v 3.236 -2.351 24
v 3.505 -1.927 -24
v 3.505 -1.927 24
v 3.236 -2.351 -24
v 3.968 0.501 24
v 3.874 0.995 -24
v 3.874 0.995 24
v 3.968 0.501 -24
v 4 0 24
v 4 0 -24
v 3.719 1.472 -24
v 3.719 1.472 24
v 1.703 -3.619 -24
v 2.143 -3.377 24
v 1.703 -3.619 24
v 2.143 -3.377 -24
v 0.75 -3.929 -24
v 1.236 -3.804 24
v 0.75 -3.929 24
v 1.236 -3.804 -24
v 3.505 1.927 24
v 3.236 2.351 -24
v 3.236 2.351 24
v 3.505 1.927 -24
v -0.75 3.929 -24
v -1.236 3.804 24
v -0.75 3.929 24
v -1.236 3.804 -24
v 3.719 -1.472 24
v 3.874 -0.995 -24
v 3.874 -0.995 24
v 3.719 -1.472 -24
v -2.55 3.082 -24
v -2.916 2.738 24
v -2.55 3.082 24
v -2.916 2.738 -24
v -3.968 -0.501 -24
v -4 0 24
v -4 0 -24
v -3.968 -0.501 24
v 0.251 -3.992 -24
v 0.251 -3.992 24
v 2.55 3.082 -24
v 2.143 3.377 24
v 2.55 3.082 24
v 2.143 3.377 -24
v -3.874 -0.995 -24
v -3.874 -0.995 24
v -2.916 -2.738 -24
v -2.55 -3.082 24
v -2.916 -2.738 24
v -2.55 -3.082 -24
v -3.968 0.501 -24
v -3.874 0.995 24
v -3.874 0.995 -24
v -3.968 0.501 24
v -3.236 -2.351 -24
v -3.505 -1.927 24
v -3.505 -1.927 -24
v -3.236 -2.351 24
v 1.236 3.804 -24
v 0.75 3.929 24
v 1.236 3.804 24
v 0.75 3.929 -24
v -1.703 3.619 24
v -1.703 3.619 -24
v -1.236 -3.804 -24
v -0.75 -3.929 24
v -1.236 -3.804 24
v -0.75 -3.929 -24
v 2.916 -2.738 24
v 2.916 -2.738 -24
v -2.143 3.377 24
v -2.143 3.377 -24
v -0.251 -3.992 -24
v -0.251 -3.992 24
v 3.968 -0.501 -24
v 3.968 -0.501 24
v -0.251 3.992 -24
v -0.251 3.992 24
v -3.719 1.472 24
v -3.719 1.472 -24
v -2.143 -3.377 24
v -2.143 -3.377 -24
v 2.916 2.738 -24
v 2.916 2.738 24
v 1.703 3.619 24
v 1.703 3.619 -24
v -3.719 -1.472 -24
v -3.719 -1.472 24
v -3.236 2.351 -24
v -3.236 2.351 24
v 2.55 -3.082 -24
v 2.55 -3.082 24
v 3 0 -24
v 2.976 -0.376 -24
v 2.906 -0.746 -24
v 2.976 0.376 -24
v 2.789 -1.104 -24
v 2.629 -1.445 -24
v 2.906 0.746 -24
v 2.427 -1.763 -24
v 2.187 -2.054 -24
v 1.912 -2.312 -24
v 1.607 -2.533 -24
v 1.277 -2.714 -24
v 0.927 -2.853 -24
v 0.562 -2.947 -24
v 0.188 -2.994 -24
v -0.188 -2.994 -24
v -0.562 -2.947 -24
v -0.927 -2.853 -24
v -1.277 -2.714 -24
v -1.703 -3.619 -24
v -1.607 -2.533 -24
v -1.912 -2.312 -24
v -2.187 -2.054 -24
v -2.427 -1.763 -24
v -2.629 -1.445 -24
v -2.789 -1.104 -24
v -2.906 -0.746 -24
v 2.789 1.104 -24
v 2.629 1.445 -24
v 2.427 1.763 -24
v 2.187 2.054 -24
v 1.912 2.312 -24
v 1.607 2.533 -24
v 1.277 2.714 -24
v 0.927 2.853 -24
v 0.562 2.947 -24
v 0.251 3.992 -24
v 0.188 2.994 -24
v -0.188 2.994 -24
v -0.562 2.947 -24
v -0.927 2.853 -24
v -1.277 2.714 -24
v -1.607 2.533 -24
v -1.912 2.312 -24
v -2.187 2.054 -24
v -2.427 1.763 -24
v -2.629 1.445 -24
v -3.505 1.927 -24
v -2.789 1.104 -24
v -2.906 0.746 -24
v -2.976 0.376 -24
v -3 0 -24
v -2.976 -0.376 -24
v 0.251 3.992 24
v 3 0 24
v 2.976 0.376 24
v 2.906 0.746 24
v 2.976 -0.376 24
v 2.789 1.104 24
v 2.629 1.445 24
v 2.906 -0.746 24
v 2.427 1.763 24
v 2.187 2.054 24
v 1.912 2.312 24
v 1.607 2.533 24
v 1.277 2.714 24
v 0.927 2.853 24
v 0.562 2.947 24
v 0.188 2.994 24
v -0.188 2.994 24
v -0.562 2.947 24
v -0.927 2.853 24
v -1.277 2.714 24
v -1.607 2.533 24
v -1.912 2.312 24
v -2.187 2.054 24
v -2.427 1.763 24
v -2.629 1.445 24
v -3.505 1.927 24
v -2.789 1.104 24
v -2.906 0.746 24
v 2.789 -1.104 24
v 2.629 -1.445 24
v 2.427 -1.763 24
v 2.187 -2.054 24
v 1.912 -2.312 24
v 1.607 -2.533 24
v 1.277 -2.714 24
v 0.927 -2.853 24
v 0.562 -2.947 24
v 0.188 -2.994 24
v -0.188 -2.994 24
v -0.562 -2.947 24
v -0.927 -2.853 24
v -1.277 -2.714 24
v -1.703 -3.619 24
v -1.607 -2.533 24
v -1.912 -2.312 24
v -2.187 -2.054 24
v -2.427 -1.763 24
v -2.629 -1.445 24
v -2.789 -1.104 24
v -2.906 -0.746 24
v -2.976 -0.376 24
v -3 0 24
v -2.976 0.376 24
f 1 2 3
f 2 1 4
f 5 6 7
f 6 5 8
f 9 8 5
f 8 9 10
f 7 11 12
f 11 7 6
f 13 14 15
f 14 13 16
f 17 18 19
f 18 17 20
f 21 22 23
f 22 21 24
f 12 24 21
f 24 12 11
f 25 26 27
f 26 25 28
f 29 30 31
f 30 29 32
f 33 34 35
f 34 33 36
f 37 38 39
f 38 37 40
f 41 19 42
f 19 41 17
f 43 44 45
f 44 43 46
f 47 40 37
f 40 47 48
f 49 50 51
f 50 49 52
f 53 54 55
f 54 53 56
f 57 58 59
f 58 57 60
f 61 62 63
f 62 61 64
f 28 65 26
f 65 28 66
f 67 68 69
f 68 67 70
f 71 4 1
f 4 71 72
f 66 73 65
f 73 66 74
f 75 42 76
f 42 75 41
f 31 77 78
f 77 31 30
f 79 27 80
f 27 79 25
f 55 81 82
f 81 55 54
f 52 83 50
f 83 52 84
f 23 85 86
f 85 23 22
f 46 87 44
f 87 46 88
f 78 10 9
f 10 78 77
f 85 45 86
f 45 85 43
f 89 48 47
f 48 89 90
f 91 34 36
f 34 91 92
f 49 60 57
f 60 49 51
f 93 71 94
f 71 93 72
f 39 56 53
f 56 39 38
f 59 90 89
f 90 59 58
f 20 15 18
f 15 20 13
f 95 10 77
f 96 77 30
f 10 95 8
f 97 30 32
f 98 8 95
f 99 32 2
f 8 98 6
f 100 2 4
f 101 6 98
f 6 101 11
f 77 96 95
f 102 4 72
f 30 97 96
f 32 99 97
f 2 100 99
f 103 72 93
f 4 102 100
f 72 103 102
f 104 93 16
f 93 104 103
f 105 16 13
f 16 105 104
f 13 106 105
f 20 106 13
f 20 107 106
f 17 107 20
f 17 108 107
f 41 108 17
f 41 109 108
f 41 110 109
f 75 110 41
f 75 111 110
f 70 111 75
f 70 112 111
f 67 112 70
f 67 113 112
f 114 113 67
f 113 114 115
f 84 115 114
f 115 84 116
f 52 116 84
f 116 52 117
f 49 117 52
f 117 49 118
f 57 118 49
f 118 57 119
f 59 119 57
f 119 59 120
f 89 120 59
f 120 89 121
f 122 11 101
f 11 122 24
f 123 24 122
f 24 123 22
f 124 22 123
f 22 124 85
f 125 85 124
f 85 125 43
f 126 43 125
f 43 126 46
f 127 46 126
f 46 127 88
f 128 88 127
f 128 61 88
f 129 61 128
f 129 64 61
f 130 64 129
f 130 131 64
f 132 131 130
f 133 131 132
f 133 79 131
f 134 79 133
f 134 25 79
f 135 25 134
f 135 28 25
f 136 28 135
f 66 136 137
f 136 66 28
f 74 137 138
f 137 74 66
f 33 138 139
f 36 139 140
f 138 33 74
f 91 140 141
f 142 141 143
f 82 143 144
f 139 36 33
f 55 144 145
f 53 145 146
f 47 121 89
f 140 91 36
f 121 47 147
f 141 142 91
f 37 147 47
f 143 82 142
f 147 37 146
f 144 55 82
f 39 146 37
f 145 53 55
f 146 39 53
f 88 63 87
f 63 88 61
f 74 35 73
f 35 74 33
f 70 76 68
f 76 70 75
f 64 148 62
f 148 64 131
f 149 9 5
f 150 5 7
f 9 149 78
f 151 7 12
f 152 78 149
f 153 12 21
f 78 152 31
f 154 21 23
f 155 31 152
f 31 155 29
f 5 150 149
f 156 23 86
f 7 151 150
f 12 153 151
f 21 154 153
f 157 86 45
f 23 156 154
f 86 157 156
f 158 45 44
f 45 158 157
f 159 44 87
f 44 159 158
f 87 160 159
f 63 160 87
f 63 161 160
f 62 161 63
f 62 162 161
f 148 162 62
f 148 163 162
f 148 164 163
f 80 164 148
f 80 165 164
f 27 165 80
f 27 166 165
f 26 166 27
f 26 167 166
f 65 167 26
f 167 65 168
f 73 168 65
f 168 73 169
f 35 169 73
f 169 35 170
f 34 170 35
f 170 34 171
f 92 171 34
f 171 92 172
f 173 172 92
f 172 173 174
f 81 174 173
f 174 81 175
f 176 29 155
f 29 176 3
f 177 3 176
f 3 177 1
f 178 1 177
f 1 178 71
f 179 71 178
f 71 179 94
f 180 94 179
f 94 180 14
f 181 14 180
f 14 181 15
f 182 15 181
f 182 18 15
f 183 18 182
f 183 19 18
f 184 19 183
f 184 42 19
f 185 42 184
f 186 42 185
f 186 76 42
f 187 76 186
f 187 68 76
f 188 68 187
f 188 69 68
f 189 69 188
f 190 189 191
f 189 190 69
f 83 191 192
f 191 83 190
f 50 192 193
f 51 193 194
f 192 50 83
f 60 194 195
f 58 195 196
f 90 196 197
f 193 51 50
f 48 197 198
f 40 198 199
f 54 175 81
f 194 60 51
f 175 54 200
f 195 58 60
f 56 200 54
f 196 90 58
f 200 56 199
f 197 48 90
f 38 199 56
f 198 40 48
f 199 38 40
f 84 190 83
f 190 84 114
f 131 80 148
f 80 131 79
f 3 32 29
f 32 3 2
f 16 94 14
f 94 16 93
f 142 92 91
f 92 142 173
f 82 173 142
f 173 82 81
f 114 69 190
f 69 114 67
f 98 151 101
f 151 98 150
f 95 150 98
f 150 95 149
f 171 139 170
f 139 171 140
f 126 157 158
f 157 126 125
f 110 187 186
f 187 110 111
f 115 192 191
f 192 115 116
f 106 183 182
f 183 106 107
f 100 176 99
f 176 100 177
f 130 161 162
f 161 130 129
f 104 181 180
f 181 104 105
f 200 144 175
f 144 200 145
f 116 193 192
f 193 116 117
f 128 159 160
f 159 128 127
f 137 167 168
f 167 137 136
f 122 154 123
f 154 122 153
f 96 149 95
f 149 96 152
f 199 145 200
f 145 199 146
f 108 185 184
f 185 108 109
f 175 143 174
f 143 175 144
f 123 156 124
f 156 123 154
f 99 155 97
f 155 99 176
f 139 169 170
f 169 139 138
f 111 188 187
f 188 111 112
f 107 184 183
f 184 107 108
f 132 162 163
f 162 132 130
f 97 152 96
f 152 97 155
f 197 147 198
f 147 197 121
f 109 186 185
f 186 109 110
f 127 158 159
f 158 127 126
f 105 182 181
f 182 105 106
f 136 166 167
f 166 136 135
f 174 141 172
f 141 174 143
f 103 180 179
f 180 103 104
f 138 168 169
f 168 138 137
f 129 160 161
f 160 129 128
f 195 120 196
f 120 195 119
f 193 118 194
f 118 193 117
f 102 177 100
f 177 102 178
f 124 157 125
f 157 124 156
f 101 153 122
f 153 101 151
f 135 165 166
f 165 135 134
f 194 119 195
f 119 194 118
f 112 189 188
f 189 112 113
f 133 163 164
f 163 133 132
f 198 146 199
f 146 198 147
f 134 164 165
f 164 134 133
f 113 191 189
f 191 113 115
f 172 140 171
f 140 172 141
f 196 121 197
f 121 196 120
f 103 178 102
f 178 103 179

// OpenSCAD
$fn = 50;


difference() {
	union() {
		translate(v = [0, 0, -24.0000000000]) {
			cylinder(h = 48, r = 4.0000000000);
		}
	}
	union() {
		translate(v = [0, 0, -100.0000000000]) {
			cylinder(h = 200, r = 3.0000000000);
		}
	}
}
